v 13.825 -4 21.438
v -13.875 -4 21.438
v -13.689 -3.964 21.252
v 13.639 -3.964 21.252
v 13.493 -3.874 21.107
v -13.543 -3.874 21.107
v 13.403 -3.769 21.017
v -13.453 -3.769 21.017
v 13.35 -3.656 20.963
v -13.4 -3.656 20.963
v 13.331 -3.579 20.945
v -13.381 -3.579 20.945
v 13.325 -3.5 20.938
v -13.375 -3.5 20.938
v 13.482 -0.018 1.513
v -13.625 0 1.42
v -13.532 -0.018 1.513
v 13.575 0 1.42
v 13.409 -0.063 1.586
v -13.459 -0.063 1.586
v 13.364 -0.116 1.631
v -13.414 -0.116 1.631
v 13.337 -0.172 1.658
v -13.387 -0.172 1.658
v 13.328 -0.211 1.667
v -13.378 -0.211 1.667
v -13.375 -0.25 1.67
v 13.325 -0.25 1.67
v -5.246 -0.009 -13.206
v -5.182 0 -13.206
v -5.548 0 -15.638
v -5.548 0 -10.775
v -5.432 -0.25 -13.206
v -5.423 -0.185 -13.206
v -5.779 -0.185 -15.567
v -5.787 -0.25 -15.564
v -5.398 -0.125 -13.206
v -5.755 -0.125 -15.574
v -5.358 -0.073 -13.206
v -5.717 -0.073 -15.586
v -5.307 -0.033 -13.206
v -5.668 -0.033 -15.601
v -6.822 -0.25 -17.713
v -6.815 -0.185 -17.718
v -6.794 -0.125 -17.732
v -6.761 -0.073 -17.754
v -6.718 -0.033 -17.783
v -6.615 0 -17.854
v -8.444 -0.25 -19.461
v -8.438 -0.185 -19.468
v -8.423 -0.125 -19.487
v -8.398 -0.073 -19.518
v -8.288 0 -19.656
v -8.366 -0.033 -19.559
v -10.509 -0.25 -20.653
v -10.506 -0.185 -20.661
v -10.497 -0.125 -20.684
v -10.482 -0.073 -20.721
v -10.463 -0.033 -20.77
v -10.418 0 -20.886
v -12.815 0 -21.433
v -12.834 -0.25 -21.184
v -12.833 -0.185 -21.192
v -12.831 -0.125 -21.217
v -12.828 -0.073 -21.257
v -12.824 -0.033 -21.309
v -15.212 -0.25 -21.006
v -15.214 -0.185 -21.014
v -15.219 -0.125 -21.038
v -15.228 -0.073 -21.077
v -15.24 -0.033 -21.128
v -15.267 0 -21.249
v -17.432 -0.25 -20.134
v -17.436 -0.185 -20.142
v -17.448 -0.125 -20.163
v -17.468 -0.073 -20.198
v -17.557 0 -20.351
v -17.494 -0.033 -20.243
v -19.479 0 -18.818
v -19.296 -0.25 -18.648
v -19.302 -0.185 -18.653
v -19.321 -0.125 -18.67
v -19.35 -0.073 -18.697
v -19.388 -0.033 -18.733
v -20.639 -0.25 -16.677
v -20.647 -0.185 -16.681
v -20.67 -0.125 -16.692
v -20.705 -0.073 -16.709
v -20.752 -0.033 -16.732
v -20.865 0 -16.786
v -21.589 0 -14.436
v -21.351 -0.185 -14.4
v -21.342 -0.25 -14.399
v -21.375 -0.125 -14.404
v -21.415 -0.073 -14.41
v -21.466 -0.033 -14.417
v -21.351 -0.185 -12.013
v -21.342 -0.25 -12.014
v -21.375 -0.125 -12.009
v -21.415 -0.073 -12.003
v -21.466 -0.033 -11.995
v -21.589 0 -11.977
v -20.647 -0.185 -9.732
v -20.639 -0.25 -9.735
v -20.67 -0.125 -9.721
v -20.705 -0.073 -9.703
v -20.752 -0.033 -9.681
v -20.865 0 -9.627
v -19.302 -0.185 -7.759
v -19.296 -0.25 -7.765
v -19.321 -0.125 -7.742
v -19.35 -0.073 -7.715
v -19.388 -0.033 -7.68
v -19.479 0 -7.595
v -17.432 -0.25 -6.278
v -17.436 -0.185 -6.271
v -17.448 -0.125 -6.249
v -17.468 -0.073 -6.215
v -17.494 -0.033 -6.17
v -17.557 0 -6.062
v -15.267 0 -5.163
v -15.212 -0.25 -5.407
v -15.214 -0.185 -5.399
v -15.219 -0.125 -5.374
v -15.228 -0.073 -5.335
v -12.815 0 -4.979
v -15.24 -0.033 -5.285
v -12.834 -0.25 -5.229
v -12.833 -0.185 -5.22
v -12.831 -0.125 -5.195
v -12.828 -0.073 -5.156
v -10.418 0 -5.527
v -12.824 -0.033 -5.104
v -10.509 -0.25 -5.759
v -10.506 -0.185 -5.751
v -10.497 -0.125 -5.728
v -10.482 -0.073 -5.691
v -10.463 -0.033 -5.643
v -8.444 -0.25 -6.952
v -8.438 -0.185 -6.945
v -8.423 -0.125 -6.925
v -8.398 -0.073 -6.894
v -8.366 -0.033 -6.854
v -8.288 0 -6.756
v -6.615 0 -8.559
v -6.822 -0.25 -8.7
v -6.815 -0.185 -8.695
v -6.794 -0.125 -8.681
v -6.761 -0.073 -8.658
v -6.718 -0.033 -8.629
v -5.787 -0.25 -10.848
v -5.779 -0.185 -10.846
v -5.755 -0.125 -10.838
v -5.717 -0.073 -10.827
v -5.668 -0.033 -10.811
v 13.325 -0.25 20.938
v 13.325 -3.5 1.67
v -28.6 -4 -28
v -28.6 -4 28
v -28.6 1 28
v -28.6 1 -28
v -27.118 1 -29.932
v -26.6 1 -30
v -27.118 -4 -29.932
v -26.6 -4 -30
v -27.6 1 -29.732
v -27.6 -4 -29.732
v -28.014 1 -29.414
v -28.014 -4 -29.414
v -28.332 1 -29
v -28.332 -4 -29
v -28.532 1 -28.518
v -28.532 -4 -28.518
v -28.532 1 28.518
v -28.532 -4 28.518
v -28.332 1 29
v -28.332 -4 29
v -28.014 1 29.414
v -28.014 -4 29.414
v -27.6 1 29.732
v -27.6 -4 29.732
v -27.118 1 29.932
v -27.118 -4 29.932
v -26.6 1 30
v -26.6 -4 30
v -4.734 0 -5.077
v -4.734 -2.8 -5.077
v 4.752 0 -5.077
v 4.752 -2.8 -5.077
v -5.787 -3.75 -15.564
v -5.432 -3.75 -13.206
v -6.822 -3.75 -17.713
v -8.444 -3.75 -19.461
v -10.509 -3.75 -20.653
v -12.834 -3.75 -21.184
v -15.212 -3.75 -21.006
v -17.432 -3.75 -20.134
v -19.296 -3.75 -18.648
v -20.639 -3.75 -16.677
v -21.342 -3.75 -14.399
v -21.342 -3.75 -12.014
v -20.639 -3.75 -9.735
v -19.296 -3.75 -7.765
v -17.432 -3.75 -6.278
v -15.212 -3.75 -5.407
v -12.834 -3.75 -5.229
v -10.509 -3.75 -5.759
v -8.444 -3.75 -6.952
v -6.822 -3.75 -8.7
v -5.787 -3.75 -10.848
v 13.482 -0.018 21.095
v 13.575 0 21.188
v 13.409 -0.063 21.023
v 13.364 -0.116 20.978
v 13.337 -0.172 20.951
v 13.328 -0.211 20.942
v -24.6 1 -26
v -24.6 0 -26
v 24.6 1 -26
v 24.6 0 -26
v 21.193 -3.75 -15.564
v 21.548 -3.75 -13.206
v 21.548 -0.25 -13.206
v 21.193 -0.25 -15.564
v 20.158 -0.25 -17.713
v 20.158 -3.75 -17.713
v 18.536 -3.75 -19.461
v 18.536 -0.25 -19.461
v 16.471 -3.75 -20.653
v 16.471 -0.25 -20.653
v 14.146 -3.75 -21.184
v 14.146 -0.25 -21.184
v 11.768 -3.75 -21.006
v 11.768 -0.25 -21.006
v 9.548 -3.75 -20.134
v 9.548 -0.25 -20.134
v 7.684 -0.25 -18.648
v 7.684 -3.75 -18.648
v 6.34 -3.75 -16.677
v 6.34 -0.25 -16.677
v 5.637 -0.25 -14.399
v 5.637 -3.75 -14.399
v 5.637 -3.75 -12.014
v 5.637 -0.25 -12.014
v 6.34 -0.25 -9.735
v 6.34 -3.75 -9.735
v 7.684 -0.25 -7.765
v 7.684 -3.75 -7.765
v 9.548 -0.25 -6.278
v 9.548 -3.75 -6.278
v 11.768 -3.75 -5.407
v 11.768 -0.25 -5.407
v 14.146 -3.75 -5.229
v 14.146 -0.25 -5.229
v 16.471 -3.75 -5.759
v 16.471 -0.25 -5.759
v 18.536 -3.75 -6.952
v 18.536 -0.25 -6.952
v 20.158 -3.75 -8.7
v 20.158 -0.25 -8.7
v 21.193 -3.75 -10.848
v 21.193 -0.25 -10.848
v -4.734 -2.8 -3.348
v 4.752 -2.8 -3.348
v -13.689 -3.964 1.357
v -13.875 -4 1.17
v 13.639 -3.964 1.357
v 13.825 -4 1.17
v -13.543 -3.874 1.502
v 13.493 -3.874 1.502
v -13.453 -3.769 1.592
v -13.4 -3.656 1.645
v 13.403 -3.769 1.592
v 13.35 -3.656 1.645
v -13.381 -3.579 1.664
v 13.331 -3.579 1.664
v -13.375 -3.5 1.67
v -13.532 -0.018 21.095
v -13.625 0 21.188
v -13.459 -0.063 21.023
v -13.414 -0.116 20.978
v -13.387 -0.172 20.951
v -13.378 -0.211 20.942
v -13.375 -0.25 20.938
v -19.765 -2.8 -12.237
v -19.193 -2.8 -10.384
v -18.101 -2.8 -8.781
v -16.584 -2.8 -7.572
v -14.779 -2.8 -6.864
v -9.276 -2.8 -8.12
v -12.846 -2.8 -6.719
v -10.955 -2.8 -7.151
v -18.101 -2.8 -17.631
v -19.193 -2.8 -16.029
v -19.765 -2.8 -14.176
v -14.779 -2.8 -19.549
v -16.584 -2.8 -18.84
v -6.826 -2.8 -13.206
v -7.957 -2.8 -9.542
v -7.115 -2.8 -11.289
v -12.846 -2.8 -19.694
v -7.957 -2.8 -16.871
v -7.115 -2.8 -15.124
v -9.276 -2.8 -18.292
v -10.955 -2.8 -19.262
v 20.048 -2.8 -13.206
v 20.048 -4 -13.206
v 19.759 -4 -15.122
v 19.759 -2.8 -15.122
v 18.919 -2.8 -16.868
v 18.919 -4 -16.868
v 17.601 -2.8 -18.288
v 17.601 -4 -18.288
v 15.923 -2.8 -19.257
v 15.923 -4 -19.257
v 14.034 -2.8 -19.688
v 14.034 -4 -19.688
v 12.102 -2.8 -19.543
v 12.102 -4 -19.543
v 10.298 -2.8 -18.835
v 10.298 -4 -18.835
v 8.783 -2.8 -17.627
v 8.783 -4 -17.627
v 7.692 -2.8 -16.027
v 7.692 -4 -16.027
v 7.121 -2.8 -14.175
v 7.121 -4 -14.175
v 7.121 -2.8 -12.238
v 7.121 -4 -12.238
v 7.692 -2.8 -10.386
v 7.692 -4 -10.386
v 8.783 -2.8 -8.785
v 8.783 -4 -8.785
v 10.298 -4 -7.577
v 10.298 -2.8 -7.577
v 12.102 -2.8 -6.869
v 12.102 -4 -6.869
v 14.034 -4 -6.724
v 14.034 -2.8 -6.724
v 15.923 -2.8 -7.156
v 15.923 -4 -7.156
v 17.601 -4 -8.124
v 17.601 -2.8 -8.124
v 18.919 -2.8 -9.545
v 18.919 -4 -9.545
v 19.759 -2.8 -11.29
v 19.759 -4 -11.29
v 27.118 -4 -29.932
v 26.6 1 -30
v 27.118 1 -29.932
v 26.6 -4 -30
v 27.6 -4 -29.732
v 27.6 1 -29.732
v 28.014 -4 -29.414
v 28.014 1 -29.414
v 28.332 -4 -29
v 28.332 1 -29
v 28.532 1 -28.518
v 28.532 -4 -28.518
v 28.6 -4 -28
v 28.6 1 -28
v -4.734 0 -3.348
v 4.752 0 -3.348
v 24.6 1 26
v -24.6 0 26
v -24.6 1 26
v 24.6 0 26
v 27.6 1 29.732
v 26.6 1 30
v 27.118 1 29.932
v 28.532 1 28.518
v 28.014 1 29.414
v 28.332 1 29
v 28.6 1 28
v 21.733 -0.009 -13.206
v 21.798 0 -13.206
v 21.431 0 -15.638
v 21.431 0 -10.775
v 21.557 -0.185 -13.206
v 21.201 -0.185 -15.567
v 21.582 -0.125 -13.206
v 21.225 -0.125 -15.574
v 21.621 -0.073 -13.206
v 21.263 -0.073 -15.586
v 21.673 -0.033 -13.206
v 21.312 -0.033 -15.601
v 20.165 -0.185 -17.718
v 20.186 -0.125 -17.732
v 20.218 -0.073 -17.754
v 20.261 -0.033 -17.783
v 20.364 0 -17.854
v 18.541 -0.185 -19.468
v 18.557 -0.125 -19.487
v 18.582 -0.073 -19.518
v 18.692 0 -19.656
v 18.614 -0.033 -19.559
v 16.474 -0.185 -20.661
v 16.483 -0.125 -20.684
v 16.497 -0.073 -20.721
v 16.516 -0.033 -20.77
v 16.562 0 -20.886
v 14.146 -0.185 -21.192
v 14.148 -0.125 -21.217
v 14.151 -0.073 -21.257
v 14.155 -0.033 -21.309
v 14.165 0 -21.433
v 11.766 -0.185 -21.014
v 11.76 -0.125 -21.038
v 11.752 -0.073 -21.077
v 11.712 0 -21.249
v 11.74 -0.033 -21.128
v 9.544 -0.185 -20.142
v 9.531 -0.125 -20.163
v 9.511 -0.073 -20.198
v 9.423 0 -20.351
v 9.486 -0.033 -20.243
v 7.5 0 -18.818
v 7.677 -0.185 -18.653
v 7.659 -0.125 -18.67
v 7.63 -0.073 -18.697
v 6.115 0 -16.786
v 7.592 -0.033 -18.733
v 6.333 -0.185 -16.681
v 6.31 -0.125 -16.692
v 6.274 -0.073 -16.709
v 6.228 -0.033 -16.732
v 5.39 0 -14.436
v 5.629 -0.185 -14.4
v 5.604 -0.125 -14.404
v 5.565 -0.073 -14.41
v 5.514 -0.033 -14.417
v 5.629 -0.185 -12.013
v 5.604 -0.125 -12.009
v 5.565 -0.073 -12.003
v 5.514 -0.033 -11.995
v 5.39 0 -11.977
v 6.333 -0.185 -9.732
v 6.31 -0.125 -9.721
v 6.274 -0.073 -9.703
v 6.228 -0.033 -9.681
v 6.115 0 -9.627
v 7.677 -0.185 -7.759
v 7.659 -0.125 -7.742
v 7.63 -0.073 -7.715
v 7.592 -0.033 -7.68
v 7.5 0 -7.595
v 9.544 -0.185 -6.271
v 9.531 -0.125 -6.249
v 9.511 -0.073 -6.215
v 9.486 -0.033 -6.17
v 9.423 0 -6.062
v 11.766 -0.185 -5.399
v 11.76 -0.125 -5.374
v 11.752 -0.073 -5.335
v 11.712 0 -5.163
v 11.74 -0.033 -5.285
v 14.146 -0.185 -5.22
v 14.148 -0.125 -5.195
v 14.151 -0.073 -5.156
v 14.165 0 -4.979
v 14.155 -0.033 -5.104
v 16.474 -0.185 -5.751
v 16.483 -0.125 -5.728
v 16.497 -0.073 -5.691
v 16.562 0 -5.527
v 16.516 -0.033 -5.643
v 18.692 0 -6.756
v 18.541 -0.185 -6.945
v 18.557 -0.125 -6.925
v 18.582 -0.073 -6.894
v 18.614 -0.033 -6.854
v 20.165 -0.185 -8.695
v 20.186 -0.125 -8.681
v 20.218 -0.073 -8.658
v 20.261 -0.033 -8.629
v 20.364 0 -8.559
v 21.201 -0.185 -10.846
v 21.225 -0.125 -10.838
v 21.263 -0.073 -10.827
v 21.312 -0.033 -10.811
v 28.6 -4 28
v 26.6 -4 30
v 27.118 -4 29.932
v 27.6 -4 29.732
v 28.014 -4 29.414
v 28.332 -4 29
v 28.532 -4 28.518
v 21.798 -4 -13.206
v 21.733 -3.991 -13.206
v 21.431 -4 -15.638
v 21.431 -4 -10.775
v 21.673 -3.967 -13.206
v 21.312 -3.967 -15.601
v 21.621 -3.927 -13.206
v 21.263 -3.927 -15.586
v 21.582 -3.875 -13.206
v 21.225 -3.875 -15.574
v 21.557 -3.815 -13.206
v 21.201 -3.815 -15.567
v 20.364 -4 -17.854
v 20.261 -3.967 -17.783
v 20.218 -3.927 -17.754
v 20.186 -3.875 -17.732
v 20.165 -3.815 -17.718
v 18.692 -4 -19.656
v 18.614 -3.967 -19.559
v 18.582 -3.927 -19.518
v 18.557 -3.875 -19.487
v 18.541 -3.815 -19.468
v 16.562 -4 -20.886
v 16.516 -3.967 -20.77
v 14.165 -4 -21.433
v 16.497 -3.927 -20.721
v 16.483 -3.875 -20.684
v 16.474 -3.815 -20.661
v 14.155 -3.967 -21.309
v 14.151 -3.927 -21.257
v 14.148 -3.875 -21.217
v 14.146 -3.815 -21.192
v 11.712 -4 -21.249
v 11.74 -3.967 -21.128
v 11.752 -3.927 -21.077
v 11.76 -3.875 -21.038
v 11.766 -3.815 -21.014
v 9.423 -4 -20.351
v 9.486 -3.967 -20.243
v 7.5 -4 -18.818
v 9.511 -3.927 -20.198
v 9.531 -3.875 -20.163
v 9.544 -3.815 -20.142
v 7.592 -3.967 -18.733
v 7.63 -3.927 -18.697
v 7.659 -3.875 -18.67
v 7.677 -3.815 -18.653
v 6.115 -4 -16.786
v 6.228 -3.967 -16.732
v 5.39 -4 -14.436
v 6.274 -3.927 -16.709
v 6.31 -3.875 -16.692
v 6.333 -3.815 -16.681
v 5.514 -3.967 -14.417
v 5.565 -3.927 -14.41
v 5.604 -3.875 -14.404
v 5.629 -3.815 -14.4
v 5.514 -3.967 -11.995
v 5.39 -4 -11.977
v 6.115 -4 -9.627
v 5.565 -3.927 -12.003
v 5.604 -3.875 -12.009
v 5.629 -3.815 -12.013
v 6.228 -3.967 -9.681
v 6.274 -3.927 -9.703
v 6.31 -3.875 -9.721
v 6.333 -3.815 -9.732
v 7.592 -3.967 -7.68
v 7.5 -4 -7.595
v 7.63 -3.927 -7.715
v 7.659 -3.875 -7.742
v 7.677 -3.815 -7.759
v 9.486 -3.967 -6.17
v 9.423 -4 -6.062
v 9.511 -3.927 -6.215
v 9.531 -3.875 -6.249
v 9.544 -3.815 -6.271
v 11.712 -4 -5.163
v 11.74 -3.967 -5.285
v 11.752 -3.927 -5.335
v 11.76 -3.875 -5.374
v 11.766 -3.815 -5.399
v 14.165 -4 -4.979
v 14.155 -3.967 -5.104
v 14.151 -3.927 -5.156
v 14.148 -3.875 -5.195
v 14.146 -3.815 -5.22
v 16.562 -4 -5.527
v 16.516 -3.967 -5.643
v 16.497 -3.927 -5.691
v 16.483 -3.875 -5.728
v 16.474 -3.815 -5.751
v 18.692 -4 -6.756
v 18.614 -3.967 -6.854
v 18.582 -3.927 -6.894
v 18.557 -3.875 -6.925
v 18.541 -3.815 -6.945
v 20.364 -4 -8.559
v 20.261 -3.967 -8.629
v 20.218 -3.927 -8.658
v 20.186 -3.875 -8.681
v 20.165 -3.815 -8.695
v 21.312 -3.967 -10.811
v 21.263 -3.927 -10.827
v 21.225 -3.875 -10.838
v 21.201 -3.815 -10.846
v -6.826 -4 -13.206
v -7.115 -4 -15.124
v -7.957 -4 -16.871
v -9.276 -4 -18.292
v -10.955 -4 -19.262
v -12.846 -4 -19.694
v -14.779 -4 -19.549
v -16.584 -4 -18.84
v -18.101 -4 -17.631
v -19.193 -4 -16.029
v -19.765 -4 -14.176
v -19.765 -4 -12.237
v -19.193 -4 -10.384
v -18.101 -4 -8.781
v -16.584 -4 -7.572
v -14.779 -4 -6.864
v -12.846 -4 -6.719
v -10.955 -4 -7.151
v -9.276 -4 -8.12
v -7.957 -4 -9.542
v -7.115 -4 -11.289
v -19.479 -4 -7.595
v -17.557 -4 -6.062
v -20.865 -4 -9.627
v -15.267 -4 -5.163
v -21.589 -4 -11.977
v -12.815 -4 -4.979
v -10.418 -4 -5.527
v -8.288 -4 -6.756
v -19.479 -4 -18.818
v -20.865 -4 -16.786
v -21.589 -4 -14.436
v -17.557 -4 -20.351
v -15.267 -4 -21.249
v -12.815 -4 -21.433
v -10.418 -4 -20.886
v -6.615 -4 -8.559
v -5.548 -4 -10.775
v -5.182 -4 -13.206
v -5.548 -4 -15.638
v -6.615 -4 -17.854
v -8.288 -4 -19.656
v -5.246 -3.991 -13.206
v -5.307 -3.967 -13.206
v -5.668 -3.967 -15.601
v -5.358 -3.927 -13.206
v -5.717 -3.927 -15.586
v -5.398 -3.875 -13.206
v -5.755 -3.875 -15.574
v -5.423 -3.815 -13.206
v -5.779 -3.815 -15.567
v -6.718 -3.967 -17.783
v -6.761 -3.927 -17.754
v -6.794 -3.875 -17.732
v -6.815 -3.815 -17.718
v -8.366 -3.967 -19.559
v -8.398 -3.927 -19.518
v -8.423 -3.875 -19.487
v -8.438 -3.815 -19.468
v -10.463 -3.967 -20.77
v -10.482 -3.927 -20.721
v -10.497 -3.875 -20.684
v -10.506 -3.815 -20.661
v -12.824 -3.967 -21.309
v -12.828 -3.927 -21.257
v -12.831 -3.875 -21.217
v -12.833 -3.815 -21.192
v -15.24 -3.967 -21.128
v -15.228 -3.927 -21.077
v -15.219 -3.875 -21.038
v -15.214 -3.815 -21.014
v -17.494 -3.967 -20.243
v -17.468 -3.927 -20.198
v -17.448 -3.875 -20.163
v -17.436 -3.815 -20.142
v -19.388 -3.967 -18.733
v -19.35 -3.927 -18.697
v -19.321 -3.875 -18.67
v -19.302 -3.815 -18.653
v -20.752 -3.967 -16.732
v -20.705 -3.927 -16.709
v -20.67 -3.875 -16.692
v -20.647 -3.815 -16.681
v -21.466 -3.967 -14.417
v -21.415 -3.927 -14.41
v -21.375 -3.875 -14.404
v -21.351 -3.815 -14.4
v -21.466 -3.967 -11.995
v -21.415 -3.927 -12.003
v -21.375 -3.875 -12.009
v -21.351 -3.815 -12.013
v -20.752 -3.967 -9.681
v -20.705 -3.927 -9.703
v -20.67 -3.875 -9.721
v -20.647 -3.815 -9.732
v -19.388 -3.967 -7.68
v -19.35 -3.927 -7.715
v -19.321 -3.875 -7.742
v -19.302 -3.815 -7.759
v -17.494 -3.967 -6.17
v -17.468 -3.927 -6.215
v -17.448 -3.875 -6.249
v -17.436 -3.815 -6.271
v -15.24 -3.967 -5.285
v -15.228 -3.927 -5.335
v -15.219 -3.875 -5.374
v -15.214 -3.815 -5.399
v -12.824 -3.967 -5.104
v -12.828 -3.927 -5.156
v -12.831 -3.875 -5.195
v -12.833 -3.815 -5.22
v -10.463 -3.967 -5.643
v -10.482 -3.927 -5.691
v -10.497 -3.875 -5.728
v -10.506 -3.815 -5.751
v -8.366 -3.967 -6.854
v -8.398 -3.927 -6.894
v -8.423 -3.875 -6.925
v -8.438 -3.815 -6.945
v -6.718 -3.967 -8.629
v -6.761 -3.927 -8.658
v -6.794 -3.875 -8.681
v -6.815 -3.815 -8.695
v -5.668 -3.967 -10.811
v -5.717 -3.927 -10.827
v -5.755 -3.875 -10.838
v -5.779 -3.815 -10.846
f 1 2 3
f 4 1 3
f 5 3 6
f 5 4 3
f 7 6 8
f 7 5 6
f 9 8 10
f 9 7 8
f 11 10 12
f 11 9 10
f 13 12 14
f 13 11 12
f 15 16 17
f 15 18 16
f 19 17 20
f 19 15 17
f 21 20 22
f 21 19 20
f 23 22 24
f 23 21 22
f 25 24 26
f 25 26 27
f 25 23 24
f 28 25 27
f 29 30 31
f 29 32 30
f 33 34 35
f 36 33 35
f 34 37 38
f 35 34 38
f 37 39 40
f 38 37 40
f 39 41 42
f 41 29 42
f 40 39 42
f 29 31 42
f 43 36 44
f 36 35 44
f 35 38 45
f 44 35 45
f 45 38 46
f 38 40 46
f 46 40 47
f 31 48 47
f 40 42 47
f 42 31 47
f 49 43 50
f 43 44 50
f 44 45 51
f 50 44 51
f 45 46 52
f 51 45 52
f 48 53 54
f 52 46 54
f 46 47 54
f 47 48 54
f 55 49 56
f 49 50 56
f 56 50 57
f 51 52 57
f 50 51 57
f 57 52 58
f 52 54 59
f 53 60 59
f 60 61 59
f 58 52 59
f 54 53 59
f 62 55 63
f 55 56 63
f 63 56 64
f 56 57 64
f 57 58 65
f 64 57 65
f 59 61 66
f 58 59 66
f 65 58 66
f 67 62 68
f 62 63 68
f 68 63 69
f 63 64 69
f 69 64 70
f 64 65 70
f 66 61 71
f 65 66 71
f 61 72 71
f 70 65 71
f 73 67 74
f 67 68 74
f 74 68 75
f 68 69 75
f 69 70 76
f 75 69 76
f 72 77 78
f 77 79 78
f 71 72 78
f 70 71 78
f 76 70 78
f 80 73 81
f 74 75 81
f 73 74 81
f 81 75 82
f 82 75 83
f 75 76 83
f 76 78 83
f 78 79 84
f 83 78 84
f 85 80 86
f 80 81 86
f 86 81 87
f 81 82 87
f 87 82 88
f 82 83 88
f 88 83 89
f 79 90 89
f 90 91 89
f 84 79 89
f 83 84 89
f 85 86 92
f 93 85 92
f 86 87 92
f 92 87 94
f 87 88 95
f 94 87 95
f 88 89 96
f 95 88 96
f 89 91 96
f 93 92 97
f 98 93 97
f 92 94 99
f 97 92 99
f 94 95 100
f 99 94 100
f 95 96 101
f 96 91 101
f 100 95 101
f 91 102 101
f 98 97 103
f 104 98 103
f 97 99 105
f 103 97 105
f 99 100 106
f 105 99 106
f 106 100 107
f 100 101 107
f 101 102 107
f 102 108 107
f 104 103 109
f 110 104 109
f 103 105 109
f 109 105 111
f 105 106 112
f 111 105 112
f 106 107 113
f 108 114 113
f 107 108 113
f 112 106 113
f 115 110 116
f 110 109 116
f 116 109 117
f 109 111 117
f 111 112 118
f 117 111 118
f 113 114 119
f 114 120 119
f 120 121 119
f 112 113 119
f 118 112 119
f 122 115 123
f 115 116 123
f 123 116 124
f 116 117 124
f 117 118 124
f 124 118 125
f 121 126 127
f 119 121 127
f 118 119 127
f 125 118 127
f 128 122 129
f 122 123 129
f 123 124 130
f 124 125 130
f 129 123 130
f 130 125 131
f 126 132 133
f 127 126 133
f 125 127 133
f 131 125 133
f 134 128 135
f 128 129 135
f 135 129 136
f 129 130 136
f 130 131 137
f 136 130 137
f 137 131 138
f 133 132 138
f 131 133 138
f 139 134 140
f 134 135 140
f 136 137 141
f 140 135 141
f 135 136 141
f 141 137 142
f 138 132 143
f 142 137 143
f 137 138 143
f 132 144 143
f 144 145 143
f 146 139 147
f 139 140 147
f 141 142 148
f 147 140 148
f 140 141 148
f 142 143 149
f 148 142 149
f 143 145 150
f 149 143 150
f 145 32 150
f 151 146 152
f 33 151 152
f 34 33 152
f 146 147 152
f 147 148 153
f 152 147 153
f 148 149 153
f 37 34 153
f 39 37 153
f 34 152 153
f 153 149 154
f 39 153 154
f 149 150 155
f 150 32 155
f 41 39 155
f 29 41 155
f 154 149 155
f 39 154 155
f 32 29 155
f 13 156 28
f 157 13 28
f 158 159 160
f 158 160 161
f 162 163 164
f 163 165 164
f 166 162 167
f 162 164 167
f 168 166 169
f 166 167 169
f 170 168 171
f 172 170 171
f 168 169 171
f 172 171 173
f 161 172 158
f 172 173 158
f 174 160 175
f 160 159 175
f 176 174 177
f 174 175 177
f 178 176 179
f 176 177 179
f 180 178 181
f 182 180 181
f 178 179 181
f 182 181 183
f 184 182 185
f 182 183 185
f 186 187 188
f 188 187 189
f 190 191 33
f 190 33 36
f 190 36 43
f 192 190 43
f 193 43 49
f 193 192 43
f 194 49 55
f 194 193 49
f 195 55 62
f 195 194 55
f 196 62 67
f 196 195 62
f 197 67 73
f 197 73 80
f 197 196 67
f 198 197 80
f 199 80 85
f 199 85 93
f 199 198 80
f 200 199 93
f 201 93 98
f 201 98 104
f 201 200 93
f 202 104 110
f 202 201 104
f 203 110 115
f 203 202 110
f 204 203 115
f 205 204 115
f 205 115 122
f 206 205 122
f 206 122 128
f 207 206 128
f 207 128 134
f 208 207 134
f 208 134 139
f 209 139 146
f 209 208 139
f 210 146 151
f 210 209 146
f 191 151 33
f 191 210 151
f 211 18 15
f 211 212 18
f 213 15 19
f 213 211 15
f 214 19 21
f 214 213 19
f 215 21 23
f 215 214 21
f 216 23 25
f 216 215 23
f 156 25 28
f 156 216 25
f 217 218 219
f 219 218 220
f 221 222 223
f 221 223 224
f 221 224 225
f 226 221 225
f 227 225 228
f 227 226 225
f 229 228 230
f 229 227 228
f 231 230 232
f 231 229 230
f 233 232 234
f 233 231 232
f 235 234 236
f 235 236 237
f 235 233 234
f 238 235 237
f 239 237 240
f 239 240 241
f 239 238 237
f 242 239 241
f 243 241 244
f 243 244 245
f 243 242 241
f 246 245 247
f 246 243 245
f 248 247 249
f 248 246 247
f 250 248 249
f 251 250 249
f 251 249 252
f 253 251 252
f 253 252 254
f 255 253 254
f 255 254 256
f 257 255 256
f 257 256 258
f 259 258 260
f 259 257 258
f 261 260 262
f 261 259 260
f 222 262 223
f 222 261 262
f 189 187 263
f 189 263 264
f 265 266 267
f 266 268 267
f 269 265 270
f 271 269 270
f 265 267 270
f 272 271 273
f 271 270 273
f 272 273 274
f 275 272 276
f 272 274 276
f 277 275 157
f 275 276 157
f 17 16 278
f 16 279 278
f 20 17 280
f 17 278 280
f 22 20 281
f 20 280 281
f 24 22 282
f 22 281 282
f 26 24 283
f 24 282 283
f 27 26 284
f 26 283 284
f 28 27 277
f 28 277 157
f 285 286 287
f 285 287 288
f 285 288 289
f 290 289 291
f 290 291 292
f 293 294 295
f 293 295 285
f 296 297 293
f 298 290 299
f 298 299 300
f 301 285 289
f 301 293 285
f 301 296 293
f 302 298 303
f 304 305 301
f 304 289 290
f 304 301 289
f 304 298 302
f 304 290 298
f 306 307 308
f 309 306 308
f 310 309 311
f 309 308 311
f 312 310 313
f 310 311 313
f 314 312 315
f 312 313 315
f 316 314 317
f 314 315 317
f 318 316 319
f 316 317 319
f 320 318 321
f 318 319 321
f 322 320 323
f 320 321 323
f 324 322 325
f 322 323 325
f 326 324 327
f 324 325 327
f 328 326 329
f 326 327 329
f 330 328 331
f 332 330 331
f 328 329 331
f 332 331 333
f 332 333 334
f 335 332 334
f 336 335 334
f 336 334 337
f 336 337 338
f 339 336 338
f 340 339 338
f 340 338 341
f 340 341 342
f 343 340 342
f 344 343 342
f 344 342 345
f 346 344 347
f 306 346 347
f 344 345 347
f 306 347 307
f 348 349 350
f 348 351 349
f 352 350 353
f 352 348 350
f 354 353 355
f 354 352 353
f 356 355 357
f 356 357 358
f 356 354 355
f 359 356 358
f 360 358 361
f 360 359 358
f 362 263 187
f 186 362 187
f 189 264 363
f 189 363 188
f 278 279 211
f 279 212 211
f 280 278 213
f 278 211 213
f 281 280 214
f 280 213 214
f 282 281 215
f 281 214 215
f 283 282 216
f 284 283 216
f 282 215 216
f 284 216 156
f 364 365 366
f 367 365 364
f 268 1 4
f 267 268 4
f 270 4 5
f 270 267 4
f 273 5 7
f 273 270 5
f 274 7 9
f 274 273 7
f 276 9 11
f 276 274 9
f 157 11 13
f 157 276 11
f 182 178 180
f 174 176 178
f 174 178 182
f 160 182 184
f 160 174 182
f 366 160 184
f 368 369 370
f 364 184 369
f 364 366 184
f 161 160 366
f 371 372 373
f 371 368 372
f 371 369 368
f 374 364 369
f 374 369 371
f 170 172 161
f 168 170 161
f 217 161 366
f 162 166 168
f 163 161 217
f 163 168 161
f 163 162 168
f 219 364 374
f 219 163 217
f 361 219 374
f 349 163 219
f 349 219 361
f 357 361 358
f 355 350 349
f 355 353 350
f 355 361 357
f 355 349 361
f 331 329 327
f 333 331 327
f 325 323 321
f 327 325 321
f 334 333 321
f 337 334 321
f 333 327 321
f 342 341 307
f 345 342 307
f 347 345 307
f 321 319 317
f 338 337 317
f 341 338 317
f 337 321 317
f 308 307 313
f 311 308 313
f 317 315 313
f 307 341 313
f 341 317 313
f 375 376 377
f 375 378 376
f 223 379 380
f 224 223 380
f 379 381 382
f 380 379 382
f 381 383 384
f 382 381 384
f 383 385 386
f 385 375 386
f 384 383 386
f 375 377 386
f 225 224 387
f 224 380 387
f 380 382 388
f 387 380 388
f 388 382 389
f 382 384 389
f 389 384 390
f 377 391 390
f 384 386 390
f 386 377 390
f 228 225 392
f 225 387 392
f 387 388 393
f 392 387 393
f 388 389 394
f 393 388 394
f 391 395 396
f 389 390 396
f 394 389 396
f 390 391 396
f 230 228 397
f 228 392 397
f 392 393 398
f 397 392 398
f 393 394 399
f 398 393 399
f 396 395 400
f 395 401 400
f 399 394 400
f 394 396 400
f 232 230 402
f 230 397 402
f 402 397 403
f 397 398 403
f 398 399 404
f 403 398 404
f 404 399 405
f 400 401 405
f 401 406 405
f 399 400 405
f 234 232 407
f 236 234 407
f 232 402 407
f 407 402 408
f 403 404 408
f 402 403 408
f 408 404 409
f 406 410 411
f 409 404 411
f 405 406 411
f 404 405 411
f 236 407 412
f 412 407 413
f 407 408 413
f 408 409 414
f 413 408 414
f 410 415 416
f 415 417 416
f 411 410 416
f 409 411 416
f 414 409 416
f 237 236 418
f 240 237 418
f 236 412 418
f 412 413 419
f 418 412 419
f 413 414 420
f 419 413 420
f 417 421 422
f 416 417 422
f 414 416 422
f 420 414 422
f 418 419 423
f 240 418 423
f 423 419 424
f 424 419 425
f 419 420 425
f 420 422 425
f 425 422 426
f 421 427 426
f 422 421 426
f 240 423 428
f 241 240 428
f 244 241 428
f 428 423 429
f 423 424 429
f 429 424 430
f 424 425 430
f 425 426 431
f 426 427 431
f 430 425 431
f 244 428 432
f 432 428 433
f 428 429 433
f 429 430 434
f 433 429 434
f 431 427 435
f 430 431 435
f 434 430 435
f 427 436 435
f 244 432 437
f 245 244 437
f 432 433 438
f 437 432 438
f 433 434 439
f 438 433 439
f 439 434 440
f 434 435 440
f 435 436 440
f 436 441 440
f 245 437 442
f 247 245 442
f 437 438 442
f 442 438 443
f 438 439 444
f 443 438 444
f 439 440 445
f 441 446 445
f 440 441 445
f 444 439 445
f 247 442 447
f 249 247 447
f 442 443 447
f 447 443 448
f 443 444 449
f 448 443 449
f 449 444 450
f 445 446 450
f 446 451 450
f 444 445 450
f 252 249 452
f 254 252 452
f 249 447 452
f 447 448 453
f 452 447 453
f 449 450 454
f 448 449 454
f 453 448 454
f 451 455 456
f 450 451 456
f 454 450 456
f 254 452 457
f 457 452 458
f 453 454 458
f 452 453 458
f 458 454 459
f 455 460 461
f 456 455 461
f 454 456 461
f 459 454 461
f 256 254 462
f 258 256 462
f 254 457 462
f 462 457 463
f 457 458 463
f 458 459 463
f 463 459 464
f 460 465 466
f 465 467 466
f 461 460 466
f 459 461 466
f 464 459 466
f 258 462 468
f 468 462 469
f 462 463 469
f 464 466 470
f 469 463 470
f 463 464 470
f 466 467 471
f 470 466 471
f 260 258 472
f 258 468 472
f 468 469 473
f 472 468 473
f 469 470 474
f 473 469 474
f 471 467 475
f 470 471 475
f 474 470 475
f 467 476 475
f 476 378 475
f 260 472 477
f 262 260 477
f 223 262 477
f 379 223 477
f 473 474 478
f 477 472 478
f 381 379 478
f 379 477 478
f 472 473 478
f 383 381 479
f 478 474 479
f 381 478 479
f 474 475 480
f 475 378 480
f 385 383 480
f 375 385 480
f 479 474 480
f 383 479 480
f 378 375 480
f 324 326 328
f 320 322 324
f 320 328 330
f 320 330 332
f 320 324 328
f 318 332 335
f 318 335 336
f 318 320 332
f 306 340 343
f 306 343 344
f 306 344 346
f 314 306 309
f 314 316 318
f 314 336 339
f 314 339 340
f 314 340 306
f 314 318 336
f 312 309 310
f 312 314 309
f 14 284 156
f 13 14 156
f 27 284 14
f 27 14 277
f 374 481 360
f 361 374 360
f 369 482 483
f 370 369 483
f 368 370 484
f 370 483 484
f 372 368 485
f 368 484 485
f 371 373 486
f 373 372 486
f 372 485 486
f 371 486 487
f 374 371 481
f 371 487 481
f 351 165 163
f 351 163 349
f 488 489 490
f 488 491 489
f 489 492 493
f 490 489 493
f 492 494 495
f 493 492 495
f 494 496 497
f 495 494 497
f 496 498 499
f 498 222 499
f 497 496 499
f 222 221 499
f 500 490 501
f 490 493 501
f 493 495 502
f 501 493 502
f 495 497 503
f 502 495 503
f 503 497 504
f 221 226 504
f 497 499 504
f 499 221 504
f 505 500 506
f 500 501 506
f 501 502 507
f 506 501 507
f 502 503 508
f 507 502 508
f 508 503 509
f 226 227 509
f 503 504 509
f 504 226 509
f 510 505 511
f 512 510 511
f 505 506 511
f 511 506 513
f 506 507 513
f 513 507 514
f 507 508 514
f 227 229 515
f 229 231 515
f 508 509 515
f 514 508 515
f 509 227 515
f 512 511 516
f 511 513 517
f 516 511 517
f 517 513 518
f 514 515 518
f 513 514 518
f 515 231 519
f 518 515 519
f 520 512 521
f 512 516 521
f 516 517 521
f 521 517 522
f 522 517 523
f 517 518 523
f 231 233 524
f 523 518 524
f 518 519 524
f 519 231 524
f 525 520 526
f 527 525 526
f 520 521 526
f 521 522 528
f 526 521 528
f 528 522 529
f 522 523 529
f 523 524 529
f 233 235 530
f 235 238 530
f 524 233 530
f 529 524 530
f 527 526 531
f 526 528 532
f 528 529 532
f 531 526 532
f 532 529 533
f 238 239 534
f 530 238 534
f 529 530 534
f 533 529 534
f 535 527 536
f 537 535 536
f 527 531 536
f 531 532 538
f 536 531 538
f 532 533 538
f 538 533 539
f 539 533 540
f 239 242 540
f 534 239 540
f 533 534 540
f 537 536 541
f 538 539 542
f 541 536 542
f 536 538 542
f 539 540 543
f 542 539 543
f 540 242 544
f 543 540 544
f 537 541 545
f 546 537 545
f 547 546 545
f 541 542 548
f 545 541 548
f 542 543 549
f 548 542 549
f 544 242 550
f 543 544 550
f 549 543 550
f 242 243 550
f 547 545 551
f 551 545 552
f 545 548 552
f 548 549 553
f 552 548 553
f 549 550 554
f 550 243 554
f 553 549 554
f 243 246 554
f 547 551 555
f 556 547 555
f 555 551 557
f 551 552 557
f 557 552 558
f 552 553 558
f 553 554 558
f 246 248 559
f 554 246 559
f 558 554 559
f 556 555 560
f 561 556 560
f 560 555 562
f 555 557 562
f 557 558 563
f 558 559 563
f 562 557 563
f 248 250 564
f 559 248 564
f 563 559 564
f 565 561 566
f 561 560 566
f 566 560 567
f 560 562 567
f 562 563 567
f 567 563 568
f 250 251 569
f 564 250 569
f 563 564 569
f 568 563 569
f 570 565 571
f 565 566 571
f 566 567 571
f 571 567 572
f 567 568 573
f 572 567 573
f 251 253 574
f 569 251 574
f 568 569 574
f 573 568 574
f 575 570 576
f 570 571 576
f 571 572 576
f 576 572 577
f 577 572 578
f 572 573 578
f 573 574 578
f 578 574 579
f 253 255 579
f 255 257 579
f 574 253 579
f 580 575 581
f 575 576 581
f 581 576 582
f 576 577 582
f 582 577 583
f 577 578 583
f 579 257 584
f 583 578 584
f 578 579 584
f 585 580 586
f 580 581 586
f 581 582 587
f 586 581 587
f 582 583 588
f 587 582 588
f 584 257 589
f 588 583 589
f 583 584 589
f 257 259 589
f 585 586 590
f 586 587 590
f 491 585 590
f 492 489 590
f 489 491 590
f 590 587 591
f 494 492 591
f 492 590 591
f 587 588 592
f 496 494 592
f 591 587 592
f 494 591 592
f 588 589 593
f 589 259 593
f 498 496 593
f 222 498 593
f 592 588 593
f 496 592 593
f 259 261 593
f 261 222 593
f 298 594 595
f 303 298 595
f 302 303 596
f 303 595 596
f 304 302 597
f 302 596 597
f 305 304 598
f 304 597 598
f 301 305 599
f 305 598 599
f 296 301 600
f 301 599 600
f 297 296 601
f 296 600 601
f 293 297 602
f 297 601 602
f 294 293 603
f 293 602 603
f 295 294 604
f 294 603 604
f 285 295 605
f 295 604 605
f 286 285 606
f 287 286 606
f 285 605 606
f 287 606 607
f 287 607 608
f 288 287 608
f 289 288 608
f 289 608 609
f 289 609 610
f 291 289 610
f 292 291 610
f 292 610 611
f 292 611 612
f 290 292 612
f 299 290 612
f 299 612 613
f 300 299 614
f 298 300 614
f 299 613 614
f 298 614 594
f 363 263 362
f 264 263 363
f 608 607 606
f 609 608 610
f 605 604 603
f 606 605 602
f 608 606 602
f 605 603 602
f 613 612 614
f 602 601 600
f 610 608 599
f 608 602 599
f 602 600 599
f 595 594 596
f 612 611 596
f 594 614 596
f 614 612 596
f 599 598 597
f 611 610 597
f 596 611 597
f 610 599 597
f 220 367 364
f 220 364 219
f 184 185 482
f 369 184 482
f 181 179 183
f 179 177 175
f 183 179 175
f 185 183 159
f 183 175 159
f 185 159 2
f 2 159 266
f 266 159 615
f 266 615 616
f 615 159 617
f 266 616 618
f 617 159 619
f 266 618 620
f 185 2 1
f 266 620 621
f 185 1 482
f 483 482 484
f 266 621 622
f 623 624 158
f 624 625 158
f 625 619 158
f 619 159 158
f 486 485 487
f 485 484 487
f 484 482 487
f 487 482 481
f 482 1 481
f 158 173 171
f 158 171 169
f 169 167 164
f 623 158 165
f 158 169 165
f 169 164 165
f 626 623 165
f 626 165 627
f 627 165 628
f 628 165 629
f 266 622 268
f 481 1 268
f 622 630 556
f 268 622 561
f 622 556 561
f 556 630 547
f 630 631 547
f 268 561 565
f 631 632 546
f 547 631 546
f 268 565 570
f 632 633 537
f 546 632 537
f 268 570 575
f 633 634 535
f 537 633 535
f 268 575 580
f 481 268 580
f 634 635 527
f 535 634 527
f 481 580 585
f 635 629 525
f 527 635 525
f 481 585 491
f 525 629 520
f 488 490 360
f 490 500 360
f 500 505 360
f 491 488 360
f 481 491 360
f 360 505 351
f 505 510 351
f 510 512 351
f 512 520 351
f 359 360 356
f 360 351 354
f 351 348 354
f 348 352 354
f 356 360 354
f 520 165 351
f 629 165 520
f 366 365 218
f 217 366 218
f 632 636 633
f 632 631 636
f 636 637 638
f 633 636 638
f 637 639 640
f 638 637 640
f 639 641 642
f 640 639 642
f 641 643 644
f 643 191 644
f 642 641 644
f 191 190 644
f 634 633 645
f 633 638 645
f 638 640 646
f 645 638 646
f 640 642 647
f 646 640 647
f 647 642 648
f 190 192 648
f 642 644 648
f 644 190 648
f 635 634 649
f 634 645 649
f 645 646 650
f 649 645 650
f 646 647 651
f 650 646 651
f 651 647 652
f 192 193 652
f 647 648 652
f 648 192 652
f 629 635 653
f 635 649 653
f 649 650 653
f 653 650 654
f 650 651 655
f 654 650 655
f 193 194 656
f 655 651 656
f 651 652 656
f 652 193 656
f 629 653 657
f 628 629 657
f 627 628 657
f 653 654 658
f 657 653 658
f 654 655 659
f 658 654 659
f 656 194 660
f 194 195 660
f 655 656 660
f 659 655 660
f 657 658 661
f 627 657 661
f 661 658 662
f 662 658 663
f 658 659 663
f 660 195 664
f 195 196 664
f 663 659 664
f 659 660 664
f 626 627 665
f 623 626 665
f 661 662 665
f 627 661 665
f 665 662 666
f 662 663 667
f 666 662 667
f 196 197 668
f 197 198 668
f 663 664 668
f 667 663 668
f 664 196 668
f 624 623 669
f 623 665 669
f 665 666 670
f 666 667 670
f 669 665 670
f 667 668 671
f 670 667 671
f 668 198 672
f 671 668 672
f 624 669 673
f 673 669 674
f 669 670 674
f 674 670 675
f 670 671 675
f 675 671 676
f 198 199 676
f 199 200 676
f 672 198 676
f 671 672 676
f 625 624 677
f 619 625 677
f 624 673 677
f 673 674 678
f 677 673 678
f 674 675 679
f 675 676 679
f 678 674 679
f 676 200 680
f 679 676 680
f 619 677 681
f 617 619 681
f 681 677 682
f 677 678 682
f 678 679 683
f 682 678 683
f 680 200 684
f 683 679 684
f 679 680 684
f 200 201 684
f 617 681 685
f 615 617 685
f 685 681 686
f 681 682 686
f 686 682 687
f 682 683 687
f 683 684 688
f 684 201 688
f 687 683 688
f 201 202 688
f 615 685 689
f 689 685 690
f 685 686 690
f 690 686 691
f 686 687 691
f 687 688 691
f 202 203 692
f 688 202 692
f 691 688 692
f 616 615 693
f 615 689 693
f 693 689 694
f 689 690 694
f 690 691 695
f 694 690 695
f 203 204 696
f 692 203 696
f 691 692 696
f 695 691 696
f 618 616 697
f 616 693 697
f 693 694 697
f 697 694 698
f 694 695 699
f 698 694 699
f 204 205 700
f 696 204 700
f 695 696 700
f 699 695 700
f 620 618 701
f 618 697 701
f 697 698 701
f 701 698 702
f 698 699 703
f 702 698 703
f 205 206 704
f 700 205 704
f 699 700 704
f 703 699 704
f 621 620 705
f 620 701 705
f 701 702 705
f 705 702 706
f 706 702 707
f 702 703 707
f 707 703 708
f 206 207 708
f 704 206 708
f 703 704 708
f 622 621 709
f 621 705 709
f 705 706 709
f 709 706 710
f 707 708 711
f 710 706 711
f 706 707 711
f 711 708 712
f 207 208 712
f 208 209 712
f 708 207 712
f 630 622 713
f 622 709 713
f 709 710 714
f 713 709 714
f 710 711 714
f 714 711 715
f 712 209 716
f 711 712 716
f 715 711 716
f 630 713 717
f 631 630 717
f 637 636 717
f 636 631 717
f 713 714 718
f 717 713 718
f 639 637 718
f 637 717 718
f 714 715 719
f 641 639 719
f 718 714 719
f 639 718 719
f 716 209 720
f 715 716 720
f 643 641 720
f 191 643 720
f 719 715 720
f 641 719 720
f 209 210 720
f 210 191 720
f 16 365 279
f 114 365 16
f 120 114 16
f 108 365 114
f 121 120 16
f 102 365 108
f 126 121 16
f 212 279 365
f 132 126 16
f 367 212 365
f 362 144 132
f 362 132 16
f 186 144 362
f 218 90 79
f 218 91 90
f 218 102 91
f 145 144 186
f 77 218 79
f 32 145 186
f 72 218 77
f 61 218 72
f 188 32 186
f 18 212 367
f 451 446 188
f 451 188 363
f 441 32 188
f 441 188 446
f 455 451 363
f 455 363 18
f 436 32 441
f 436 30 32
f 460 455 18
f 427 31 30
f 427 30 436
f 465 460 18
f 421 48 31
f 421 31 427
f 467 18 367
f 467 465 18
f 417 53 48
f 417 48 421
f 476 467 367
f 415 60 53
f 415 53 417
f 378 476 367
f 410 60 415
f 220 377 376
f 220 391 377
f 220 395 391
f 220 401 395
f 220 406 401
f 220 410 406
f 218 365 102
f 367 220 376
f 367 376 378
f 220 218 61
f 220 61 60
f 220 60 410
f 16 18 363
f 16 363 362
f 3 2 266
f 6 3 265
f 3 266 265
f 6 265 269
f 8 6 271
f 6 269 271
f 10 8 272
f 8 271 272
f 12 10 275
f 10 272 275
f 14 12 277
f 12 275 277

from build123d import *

# Parameters (mm, degrees)
ESQUISSE1_W              = 49.2
ESQUISSE1_H              = 52
BOSS_EXTRU_1_DEPTH       = 1
COQUE1_T                 = 4
CONG_1_R                 = 2
CONG_2_R                 = 2
CONG_3_R                 = 2
CONG_4_R                 = 2
EMPREINTE1_START         = -2.8
EMPREINTE1_OUTLINE_W     = 9.485715654
EMPREINTE1_OUTLINE_H     = 1.728890806
EMPREINTE1_OUTLINE_R     = 8
EMPREINTE1_DEPTH         = 2.8
EMPREINTE1_START_2       = -4
EMPREINTE1_2_OUTLINE_R   = 8
EMPREINTE1_2_OUTLINE_R_2 = 6.505433518
EMPREINTE1_2_OUTLINE_R_3 = 6.5
EMPREINTE1_2_DEPTH       = 1.2
EMPREINTE2_START         = -13.375027479
EMPREINTE2_OUTLINE_W     = 0.5
EMPREINTE2_OUTLINE_H     = 19.268
EMPREINTE2_DEPTH         = 26.7
ESQUISSE2_W              = 26.7
ESQUISSE2_H              = 19.268
ENL_V_MAT_EXTRU_1_DEPTH  = 10
CONG_5_R                 = 0.5
CONG_6_R                 = 0.25
CONG_7_R                 = 0.25
CONG_8_R                 = 0.25


# Read off the part's stored shape, not the designer's step: Empreinte1, Empreinte2
with BuildPart() as part:
    # Esquisse1 → Boss.-Extru.1 (new body)
    with BuildSketch(Plane(origin=(0, 0, 0), x_dir=(1, 0, 0), z_dir=(0, 1, 0))):
        Rectangle(ESQUISSE1_W, ESQUISSE1_H)
    extrude(amount=BOSS_EXTRU_1_DEPTH)

    # Coque1
    coque1_openings = [part.faces().sort_by_distance(p)[0] for p in [
        (0, 1, 0),
    ]]
    offset(amount=COQUE1_T, openings=coque1_openings, kind=Kind.INTERSECTION)

    # Congé1
    # the kernel refuses this fillet: 2 mm, written as the material it takes off along each edge
    with BuildSketch(Plane(origin=(28.6, -9, 30), x_dir=(-1, 0, 0), z_dir=(0, 1, 0))) as cong_1_piece_1:
        with BuildLine():
            CenterArc((CONG_1_R, -CONG_1_R), CONG_1_R, 90, 90)
            Line((0, -CONG_1_R), (0, 0))
            Line((0, 0), (CONG_1_R, 0))
        make_face()
    extrude(amount=15, mode=Mode.SUBTRACT)

    # Congé2
    cong_2_edges = [part.edges().sort_by_distance(p)[0] for p in [
        (28.6, -1.5, -30),
    ]]
    fillet(cong_2_edges, radius=CONG_2_R)

    # Congé3
    cong_3_edges = [part.edges().sort_by_distance(p)[0] for p in [
        (-28.6, -1.5, -30),
    ]]
    fillet(cong_3_edges, radius=CONG_3_R)

    # Congé4
    cong_4_edges = [part.edges().sort_by_distance(p)[0] for p in [
        (-28.6, -1.5, 30),
    ]]
    fillet(cong_4_edges, radius=CONG_4_R)

    # Empreinte1 outline → Empreinte1 (cut)
    with BuildSketch(Plane(origin=(0, 0, 0), x_dir=(1, 0, 0), z_dir=(0, 1, 0)).offset(EMPREINTE1_START)):
        with Locations((0.008688744, 4.212378703)):
            Rectangle(EMPREINTE1_OUTLINE_W, EMPREINTE1_OUTLINE_H)
        with Locations((-13.431637238, 13.206277507)):
            Circle(EMPREINTE1_OUTLINE_R)
        with Locations((13.548007164, 13.206277507)):
            Circle(EMPREINTE1_OUTLINE_R)
    extrude(amount=EMPREINTE1_DEPTH, mode=Mode.SUBTRACT)

    # Empreinte1 2 outline → Empreinte1 2 (cut)
    # profile 1 of 2: a face of its own
    with BuildSketch(Plane(origin=(0, 0, 0), x_dir=(1, 0, 0), z_dir=(0, 1, 0)).offset(EMPREINTE1_START_2)):
        with Locations((-13.431637238, 13.206277507)):
            Circle(EMPREINTE1_2_OUTLINE_R)
        with Locations((-13.331770872, 13.206277507)):
            Circle(EMPREINTE1_2_OUTLINE_R_2, mode=Mode.SUBTRACT)
    # profile 2 of 2: a face of its own
    with BuildSketch(Plane(origin=(0, 0, 0), x_dir=(1, 0, 0), z_dir=(0, 1, 0)).offset(EMPREINTE1_START_2)):
        with Locations((13.548007164, 13.206277507)):
            Circle(EMPREINTE1_2_OUTLINE_R)
        with Locations((13.548007164, 13.206277507)):
            Circle(EMPREINTE1_2_OUTLINE_R_3, mode=Mode.SUBTRACT)
    extrude(amount=EMPREINTE1_2_DEPTH, mode=Mode.SUBTRACT)

    # Empreinte2 outline → Empreinte2 (cut)
    with BuildSketch(Plane.YZ.offset(EMPREINTE2_START)):
        with Locations((-0.25, 11.304369063)):
            Rectangle(EMPREINTE2_OUTLINE_W, EMPREINTE2_OUTLINE_H)
    extrude(amount=EMPREINTE2_DEPTH, mode=Mode.SUBTRACT)

    # Esquisse2 → Enlèv. mat.-Extru.1 (cut)
    with BuildSketch(Plane(origin=(0, 0, 0), x_dir=(1, 0, 0), z_dir=(0, 1, 0))):
        with Locations((-0.025027479, -11.304369063)):
            Rectangle(ESQUISSE2_W, ESQUISSE2_H)
    extrude(amount=-ENL_V_MAT_EXTRU_1_DEPTH, mode=Mode.SUBTRACT)

    # Congé5
    cong_5_edges = [part.edges().sort_by_distance(p)[0] for p in [
        (-13.375027479, -4, 11.304369063),
        (-0.025027479, -4, 1.670369063),
        (13.324972521, -4, 11.304369063),
        (-0.025027479, -4, 20.938369063),
    ]]
    fillet(cong_5_edges, radius=CONG_5_R)

    # Congé6
    cong_6_edges = [part.edges().sort_by_distance(p)[0] for p in [
        (5.548007164, -4, -13.206277507),
        (-21.431637238, -4, -13.206277507),
    ]]
    fillet(cong_6_edges, radius=CONG_6_R)

    # Congé7
    cong_7_edges = [part.edges().sort_by_distance(p)[0] for p in [
        (-21.431637238, 0, -13.206277507),
        (5.548007164, 0, -13.206277507),
    ]]
    fillet(cong_7_edges, radius=CONG_7_R)

    # Congé8
    cong_8_edges = [part.edges().sort_by_distance(p)[0] for p in [
        (-0.025027479, 0, 1.670369063),
        (-13.375027479, 0, 11.304369063),
        (-0.025027479, 0, 20.938369063),
        (13.324972521, 0, 11.304369063),
    ]]
    fillet(cong_8_edges, radius=CONG_8_R)


solid = part.part
